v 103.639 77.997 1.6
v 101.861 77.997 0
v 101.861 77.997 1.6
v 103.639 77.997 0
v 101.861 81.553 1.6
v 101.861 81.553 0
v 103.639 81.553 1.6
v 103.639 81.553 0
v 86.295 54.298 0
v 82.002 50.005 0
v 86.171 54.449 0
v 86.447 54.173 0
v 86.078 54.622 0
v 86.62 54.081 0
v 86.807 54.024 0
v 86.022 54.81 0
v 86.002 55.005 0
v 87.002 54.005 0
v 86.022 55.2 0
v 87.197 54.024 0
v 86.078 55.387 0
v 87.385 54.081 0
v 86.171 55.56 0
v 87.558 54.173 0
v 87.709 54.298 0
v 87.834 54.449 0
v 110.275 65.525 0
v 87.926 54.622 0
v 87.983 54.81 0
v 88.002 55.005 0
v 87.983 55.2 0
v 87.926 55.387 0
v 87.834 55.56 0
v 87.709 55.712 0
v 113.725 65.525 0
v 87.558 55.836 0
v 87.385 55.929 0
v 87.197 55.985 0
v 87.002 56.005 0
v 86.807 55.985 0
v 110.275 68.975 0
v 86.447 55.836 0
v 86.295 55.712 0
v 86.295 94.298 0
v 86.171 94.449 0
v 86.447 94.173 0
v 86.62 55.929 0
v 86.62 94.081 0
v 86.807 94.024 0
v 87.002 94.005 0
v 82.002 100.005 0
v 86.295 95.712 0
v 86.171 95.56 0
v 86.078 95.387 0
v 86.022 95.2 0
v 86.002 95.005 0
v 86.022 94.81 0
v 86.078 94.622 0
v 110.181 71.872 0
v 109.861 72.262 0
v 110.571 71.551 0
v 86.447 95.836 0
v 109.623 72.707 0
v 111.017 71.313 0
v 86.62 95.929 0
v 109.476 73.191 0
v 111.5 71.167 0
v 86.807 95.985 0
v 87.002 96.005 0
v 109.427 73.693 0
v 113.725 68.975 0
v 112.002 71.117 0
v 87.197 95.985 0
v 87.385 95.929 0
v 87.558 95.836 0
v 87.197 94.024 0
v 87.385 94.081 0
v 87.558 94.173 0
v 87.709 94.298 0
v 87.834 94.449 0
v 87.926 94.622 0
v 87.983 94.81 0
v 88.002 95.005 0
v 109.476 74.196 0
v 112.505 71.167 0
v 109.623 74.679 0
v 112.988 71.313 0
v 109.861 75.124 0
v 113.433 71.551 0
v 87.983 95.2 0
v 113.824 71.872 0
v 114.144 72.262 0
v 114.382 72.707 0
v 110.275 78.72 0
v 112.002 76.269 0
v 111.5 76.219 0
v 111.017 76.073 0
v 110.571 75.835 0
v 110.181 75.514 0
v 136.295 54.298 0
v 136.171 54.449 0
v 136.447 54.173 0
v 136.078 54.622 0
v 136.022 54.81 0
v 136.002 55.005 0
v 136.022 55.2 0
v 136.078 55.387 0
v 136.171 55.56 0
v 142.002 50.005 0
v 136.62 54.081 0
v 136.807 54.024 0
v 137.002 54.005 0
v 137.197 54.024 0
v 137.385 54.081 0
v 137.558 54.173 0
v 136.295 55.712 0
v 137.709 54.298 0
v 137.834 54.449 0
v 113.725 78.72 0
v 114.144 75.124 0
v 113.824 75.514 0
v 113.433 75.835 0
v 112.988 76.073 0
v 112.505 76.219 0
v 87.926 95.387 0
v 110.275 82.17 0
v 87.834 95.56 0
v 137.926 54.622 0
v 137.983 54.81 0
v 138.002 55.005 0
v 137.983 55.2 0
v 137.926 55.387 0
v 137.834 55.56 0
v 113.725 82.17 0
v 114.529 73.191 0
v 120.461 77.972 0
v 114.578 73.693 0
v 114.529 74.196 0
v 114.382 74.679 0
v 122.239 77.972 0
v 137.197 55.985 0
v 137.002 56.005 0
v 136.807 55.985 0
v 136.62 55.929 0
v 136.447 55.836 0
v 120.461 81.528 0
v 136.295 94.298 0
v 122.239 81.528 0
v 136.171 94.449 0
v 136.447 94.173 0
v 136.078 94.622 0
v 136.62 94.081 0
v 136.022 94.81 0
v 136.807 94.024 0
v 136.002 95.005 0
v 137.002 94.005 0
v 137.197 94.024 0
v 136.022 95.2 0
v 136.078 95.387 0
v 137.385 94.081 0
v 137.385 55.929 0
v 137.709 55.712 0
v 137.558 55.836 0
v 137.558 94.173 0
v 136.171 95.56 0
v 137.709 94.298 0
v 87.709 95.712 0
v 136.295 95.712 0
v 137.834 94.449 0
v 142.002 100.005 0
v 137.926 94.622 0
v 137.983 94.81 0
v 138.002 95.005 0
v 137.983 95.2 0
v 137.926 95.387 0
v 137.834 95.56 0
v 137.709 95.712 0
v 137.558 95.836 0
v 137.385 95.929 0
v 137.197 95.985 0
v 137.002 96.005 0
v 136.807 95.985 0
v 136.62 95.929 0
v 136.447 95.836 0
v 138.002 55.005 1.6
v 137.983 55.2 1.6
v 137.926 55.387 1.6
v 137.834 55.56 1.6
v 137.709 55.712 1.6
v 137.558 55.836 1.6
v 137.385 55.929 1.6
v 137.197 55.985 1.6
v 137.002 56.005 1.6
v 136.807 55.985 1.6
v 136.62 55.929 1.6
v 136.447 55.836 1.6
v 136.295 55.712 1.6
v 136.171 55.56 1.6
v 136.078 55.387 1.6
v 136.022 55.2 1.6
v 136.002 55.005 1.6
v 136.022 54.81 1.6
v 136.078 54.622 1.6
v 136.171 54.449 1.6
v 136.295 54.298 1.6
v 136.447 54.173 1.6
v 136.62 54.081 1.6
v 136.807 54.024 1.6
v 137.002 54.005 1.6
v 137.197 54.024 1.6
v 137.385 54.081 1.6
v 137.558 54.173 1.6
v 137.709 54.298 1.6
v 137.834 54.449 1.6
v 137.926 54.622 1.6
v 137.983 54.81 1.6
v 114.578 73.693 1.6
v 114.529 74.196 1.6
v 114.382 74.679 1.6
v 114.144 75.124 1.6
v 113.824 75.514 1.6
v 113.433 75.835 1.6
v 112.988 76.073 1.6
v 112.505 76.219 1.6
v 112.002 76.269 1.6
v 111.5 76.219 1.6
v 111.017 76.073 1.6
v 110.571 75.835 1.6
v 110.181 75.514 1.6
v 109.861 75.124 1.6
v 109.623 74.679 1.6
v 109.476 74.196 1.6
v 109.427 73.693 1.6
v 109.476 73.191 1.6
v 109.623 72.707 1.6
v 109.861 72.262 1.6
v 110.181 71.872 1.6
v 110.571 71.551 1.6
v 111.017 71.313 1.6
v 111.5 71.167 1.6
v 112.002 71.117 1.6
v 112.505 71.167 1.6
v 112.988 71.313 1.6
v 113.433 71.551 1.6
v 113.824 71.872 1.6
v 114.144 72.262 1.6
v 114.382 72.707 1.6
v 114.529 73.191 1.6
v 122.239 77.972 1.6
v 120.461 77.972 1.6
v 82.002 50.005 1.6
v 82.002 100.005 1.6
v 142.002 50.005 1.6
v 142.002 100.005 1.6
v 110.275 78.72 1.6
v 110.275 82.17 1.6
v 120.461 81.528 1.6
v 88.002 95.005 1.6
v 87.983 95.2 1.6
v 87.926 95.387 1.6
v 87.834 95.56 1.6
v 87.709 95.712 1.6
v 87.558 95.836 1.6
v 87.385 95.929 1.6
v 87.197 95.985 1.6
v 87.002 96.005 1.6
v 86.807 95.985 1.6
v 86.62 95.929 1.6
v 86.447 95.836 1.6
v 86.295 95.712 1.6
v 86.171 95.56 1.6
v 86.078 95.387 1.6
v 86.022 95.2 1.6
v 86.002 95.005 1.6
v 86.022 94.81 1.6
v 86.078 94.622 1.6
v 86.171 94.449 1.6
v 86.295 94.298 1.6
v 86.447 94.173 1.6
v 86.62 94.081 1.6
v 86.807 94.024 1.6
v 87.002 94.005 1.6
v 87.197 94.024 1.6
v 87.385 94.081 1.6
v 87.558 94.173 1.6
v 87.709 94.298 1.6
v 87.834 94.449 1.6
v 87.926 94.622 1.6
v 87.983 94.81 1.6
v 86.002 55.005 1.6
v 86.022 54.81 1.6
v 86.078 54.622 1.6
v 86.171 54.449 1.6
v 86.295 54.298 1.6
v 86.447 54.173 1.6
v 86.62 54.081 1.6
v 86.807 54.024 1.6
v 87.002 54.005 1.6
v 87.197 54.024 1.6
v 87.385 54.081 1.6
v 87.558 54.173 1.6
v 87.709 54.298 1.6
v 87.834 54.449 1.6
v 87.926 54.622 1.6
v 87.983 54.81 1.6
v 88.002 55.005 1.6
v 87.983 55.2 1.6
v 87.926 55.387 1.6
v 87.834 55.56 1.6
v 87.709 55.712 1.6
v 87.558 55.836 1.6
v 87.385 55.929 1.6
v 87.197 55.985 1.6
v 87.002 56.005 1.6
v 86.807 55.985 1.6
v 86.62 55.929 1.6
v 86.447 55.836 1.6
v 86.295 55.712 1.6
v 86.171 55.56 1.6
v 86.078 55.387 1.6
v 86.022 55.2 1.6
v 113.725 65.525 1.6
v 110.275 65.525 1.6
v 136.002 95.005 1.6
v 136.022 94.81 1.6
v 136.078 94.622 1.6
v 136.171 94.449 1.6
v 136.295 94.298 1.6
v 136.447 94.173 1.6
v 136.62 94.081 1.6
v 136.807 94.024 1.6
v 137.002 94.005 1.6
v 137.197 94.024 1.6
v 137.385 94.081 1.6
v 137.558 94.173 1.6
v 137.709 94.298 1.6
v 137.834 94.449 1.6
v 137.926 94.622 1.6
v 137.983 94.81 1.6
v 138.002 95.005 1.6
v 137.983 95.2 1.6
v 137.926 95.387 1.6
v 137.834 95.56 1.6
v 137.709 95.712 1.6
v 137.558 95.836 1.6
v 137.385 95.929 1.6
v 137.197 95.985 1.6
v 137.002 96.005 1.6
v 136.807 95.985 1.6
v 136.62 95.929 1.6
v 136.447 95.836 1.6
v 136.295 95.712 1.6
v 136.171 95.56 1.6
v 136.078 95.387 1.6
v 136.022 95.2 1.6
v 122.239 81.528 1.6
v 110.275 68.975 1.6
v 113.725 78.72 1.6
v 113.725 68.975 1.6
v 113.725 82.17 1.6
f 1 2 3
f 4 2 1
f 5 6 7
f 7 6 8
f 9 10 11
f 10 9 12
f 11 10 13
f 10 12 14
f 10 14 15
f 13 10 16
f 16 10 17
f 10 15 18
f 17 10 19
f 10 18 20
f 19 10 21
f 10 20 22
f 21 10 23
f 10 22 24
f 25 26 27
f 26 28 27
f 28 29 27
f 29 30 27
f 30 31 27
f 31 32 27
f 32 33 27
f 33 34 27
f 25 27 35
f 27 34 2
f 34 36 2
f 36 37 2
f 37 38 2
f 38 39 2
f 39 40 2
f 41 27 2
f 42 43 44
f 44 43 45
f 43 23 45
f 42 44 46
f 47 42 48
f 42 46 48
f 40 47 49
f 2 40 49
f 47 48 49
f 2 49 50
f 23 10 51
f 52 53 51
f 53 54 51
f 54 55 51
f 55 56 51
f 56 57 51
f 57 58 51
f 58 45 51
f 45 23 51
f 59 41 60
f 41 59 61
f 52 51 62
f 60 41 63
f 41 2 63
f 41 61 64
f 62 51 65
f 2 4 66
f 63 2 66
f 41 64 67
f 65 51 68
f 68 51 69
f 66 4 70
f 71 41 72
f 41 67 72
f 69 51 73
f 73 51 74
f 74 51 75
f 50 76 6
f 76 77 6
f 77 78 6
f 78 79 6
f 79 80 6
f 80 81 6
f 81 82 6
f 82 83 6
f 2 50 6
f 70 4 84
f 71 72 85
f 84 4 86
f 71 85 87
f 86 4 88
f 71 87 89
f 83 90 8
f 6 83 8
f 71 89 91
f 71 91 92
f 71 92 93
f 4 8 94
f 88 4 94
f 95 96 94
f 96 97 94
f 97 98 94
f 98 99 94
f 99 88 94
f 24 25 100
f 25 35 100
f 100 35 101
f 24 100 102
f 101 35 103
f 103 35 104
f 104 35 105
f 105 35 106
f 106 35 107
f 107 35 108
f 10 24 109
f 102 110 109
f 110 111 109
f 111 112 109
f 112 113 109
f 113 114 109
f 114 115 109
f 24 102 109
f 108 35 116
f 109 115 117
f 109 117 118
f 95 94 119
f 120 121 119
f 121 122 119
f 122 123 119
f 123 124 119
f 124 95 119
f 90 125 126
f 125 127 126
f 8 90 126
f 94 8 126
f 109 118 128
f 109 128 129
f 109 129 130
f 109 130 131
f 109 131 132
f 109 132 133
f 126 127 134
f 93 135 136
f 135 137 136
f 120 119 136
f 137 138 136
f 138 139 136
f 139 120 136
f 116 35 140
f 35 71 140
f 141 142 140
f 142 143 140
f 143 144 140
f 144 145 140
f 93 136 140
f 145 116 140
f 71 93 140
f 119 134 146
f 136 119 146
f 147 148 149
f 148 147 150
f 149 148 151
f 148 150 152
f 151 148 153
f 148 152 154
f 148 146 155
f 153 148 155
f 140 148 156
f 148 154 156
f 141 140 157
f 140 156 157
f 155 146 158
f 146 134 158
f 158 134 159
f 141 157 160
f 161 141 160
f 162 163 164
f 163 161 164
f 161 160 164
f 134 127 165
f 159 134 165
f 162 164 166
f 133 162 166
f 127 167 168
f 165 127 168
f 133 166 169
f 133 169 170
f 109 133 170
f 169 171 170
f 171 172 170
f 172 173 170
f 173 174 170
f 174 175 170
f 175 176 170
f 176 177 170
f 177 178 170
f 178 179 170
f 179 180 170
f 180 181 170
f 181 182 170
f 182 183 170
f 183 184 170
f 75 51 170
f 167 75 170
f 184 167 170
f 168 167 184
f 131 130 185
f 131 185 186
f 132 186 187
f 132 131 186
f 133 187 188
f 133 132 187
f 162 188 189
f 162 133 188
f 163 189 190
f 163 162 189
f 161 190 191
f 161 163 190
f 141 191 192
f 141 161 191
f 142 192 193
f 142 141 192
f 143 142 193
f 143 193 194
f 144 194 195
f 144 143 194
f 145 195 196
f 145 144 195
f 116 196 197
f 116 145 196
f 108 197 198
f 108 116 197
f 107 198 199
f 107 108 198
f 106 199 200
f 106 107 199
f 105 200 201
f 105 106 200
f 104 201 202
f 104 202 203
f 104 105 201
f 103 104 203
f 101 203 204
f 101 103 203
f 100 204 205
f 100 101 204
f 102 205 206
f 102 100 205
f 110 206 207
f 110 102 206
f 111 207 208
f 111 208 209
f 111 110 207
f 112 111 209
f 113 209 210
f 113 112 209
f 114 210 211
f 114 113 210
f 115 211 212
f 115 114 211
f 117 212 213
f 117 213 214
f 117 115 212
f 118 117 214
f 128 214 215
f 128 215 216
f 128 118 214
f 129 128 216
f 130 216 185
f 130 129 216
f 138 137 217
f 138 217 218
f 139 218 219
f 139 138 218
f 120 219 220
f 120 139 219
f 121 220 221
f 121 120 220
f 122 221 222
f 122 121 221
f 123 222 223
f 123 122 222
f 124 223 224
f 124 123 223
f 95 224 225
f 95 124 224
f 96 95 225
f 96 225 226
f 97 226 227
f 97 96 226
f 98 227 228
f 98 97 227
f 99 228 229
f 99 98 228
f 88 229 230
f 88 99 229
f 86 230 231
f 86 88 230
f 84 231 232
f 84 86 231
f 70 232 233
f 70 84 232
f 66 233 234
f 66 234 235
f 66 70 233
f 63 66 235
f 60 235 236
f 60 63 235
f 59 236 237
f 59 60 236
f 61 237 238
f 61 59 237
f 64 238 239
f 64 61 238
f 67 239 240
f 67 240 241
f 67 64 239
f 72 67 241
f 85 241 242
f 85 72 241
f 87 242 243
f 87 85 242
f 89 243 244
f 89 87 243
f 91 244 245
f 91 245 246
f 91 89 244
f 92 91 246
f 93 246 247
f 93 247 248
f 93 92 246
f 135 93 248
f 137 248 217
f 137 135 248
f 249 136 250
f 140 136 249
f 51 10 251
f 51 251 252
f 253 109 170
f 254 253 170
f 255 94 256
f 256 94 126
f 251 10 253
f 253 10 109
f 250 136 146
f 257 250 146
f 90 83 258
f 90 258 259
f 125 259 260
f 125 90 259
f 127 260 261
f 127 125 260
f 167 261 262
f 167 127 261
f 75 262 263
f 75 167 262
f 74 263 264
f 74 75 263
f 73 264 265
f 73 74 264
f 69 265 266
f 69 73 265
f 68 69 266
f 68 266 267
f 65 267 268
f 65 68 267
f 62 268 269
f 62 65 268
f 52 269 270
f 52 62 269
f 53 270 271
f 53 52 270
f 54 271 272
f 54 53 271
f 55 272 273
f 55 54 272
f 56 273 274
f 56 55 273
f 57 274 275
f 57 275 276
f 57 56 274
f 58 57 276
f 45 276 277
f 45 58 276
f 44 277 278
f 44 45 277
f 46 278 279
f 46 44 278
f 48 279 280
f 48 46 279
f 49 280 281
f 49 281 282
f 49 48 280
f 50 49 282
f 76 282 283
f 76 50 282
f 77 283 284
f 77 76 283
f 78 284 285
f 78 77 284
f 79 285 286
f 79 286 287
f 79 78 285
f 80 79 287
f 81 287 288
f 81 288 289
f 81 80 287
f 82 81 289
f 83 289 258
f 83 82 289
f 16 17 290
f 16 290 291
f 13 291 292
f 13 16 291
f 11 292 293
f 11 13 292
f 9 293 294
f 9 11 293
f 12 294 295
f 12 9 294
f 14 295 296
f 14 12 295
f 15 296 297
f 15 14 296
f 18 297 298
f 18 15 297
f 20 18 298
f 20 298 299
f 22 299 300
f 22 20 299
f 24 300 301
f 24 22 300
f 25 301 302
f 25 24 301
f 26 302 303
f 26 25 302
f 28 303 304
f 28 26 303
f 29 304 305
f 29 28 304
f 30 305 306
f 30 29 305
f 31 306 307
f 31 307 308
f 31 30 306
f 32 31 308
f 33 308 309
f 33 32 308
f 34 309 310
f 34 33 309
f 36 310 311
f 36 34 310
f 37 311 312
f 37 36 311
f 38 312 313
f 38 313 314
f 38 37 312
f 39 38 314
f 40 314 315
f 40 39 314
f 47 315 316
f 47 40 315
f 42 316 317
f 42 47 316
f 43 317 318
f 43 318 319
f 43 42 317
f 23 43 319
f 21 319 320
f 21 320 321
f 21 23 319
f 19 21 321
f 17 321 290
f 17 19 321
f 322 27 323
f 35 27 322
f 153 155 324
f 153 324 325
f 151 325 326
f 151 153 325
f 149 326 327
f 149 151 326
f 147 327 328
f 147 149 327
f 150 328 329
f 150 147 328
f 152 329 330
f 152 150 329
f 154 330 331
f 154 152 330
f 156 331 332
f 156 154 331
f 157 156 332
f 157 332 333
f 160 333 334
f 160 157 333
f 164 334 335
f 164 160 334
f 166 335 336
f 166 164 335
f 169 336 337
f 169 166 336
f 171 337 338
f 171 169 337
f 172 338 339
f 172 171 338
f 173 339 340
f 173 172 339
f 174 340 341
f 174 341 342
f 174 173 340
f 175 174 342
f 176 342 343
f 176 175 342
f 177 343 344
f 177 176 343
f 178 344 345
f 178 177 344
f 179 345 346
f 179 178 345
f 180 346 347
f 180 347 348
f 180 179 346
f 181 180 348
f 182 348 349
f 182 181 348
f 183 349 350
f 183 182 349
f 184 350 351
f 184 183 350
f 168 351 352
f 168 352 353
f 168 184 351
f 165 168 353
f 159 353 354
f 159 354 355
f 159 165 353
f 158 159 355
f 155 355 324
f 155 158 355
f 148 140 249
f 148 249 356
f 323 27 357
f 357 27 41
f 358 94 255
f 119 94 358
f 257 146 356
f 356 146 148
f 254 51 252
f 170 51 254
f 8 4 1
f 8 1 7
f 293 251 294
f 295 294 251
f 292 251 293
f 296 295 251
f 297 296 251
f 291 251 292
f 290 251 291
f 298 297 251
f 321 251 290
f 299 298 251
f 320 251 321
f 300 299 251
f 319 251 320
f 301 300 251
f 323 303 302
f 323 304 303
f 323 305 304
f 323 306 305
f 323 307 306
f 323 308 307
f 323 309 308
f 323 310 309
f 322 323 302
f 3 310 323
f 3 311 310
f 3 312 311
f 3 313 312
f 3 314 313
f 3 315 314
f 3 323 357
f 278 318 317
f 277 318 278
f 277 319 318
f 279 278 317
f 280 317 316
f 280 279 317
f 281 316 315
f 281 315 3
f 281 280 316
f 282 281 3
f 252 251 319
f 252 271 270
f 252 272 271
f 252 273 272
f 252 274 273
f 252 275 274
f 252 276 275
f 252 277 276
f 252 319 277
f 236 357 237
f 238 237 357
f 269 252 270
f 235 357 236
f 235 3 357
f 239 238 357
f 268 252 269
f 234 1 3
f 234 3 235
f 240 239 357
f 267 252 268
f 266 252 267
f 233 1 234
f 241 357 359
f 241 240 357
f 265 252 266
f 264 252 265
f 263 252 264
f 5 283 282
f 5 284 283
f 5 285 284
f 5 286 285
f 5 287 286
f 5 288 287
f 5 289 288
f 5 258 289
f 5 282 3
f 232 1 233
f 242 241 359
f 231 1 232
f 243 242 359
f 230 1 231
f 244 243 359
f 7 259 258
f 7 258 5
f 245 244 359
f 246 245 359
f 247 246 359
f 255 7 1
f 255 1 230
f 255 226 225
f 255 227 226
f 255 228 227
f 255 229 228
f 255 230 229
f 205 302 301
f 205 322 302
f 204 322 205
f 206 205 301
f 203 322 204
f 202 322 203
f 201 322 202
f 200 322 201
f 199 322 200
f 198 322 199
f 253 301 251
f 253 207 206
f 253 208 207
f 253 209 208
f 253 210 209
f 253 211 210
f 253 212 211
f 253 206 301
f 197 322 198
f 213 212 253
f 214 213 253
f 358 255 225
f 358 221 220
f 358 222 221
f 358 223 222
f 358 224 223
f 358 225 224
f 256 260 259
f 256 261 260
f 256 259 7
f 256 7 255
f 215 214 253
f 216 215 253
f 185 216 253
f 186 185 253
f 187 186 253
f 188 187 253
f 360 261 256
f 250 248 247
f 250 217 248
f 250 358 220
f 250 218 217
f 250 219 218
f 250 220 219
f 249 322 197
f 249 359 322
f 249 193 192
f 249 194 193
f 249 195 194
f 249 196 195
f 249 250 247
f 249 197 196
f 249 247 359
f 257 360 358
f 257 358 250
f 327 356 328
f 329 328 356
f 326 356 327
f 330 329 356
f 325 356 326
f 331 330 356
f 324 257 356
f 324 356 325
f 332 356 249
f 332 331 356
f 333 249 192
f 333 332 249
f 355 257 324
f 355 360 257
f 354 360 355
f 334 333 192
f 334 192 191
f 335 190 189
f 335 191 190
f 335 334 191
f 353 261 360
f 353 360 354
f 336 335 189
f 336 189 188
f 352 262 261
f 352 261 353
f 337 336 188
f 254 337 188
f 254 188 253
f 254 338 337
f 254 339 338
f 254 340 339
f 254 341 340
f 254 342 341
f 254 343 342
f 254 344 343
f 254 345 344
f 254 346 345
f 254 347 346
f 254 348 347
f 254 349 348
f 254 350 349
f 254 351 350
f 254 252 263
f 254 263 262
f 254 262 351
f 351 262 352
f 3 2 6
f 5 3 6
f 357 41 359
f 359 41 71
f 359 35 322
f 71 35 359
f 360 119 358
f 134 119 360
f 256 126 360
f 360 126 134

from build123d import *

# Parameters (mm, degrees)
MODEL_W             = 60
MODEL_H             = 50
MODEL_R             = 2.57574226
MODEL_R_2           = 1
MODEL_W_2           = 1.778
MODEL_H_2           = 3.556
MODEL_W_3           = 3.45000072
MODEL_H_3           = 3.45000072
BOSS_EXTRUDE1_DEPTH = 1.6


with BuildPart() as part:
    # Model → Boss-Extrude1 (new body)
    with BuildSketch(Plane.XY):
        with Locations((112.002348606, 75.004629004)):
            Rectangle(MODEL_W, MODEL_H)
        with Locations((112.002348606, 73.693071842)):
            Circle(MODEL_R, mode=Mode.SUBTRACT)
        with Locations((87.002348606, 95.004629004)):
            Circle(MODEL_R_2, mode=Mode.SUBTRACT)
        with Locations(Location((137.002348606, 95.004629004, 0), (0, 0, 180))):
            Circle(MODEL_R_2, mode=Mode.SUBTRACT)
        with Locations((137.002348606, 55.004629004)):
            Circle(MODEL_R_2, mode=Mode.SUBTRACT)
        with Locations(Location((87.002348606, 55.004629004, 0), (0, 0, 180))):
            Circle(MODEL_R_2, mode=Mode.SUBTRACT)
        with Locations((121.3499986, 79.75000052)):
            Rectangle(MODEL_W_2, MODEL_H_2, mode=Mode.SUBTRACT)
        with Locations((102.75000024, 79.7749992)):
            Rectangle(MODEL_W_2, MODEL_H_2, mode=Mode.SUBTRACT)
        with Locations((111.99999952, 80.44520106)):
            Rectangle(MODEL_W_3, MODEL_H_3, mode=Mode.SUBTRACT)
        with Locations((111.99999952, 67.25000012)):
            Rectangle(MODEL_W_3, MODEL_H_3, mode=Mode.SUBTRACT)
    extrude(amount=BOSS_EXTRUDE1_DEPTH)


solid = part.part
